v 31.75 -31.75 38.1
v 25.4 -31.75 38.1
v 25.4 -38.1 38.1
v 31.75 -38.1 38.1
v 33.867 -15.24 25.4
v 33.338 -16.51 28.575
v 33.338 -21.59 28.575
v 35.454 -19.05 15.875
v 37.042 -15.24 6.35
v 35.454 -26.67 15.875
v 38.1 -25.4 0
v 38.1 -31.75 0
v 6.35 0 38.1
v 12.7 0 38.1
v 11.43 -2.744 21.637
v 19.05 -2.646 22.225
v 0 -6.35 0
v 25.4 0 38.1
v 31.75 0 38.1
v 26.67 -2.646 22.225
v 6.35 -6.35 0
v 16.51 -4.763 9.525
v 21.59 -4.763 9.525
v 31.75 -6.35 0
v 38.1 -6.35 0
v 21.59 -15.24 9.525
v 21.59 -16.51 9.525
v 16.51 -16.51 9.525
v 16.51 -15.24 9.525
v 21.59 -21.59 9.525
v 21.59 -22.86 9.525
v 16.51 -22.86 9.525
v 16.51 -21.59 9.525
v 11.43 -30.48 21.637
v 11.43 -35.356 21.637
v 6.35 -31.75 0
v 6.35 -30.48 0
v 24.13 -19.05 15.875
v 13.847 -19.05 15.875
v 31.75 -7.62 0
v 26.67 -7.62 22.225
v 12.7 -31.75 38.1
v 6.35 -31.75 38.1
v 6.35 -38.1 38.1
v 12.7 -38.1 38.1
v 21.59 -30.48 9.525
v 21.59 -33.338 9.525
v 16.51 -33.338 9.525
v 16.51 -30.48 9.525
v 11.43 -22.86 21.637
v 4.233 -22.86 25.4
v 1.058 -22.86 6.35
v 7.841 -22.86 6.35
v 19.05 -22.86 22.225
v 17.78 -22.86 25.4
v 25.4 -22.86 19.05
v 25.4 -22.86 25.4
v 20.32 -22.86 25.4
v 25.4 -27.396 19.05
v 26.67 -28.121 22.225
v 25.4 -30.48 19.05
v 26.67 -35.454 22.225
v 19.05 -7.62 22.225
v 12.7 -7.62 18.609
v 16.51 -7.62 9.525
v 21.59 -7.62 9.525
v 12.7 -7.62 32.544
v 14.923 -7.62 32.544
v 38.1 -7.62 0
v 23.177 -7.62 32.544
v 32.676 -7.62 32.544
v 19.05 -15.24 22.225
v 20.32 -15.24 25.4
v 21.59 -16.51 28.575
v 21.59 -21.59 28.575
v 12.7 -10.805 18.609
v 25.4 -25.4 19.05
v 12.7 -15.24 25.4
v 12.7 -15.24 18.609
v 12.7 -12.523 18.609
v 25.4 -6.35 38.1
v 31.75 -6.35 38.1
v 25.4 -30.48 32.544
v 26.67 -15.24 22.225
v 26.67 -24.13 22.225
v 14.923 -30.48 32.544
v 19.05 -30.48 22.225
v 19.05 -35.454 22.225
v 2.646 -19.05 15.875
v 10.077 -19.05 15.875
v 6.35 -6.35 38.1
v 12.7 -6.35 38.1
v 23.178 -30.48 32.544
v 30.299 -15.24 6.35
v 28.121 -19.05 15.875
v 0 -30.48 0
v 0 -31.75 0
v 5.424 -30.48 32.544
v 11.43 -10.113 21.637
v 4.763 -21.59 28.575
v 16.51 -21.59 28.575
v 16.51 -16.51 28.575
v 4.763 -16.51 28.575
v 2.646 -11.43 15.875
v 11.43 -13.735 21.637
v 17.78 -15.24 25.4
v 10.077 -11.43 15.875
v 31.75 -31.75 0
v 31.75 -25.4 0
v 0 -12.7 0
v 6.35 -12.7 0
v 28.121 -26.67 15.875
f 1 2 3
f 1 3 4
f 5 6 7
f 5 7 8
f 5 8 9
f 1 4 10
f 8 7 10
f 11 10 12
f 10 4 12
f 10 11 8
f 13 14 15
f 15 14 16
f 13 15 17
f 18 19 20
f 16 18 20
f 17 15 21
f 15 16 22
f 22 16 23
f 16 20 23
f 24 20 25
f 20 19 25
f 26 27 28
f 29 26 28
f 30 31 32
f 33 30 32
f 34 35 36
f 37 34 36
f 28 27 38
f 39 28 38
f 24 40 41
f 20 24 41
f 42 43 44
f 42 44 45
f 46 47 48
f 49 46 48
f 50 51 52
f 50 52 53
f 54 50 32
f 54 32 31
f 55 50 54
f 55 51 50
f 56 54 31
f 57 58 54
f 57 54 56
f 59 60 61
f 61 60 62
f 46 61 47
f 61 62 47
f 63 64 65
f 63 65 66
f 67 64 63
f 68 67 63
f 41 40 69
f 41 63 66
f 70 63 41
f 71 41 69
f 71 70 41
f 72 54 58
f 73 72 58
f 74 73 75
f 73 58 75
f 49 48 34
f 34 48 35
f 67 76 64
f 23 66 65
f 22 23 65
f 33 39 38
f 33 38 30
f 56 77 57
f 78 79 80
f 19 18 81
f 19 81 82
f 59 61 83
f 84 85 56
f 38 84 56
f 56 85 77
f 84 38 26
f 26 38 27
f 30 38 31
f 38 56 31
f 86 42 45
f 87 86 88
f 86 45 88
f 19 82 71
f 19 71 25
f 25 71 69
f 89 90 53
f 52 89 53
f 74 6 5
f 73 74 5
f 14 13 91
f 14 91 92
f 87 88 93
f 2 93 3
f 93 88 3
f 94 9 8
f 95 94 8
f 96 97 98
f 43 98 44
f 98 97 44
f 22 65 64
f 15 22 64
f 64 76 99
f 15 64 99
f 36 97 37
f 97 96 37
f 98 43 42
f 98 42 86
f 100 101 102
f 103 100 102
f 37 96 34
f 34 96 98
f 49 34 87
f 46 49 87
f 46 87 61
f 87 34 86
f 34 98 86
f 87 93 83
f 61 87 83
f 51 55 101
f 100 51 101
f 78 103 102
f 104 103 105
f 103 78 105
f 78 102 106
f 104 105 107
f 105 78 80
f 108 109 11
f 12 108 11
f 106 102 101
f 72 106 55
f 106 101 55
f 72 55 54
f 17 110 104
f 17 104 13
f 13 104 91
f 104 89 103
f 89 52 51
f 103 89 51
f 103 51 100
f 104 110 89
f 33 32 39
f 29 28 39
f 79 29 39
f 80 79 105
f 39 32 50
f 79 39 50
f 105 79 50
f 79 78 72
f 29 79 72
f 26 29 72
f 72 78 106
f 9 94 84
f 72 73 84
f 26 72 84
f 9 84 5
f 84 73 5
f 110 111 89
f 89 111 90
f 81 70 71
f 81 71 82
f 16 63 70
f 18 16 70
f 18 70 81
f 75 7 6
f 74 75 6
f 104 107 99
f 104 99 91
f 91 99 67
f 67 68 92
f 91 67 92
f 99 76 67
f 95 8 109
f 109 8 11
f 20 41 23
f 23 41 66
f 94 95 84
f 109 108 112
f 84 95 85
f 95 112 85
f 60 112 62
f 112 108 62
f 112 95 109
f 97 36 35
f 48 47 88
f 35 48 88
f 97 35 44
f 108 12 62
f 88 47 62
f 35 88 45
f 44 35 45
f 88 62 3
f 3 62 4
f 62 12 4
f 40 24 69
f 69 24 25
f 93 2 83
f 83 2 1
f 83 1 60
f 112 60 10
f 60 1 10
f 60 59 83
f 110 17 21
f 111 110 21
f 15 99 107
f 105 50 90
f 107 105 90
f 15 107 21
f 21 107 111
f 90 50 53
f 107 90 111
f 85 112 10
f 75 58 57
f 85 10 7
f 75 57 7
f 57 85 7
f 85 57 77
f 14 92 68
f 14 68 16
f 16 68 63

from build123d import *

# Parameters (mm, degrees)
F0_W      = 38.1
F0_H      = 38.1
F1_DEPTH  = 38.1
F6_DEPTH  = 38.1
F8_DEPTH  = 38.1
F9_W      = 25.4
F9_H      = 7.62
F10_DEPTH = 38.1


with BuildPart() as f1:
    # F0 (on Front) → F1 (new body)
    with BuildSketch(Plane.XZ):
        with Locations((19.05, 19.05)):
            Rectangle(F0_W, F0_H)
    extrude(amount=F1_DEPTH)

    # F5 (on offset) → F6 (cut)
    with BuildSketch(Plane.YZ.offset(38.1)):
        Polygon((-6.35, 38.1), (-31.75, 38.1), (-26.67, 15.875), (-21.59, 28.575), (-16.51, 28.575), (-11.43, 15.875), align=None)
        Polygon((-19.05, 15.875), (-25.4, 0), (-12.7, 0), align=None)
        Polygon((-31.75, 0), (-38.1, 38.1), (-38.1, 0), align=None)
        Polygon((0, 0), (0, 38.1), (-6.35, 0), align=None)
    extrude(amount=-F6_DEPTH, mode=Mode.SUBTRACT)

    # F7 (on offset) → F8 (cut)
    with BuildSketch(Plane.XZ.offset(38.1)):
        Polygon((0, 38.1), (0, 0), (6.35, 38.1), align=None)
        Polygon((25.4, 38.1), (12.7, 38.1), (19.05, 22.225), align=None)
        Polygon((31.75, 38.1), (38.1, 0), (38.1, 38.1), align=None)
        Polygon((11.43, 21.636641), (6.35, 0), (31.75, 0), (26.67, 22.225), (21.59, 9.525), (16.51, 9.525), align=None)
    extrude(amount=-F8_DEPTH, mode=Mode.SUBTRACT)

    # F9 (on offset) → F10 (cut)
    with BuildSketch(Plane.XY.offset(38.1)):
        with Locations((25.4, -11.43)):
            Rectangle(F9_W, F9_H)
        with Locations((12.7, -26.67)):
            Rectangle(F9_W, F9_H)
    extrude(amount=-F10_DEPTH, mode=Mode.SUBTRACT)


solid = f1.part
